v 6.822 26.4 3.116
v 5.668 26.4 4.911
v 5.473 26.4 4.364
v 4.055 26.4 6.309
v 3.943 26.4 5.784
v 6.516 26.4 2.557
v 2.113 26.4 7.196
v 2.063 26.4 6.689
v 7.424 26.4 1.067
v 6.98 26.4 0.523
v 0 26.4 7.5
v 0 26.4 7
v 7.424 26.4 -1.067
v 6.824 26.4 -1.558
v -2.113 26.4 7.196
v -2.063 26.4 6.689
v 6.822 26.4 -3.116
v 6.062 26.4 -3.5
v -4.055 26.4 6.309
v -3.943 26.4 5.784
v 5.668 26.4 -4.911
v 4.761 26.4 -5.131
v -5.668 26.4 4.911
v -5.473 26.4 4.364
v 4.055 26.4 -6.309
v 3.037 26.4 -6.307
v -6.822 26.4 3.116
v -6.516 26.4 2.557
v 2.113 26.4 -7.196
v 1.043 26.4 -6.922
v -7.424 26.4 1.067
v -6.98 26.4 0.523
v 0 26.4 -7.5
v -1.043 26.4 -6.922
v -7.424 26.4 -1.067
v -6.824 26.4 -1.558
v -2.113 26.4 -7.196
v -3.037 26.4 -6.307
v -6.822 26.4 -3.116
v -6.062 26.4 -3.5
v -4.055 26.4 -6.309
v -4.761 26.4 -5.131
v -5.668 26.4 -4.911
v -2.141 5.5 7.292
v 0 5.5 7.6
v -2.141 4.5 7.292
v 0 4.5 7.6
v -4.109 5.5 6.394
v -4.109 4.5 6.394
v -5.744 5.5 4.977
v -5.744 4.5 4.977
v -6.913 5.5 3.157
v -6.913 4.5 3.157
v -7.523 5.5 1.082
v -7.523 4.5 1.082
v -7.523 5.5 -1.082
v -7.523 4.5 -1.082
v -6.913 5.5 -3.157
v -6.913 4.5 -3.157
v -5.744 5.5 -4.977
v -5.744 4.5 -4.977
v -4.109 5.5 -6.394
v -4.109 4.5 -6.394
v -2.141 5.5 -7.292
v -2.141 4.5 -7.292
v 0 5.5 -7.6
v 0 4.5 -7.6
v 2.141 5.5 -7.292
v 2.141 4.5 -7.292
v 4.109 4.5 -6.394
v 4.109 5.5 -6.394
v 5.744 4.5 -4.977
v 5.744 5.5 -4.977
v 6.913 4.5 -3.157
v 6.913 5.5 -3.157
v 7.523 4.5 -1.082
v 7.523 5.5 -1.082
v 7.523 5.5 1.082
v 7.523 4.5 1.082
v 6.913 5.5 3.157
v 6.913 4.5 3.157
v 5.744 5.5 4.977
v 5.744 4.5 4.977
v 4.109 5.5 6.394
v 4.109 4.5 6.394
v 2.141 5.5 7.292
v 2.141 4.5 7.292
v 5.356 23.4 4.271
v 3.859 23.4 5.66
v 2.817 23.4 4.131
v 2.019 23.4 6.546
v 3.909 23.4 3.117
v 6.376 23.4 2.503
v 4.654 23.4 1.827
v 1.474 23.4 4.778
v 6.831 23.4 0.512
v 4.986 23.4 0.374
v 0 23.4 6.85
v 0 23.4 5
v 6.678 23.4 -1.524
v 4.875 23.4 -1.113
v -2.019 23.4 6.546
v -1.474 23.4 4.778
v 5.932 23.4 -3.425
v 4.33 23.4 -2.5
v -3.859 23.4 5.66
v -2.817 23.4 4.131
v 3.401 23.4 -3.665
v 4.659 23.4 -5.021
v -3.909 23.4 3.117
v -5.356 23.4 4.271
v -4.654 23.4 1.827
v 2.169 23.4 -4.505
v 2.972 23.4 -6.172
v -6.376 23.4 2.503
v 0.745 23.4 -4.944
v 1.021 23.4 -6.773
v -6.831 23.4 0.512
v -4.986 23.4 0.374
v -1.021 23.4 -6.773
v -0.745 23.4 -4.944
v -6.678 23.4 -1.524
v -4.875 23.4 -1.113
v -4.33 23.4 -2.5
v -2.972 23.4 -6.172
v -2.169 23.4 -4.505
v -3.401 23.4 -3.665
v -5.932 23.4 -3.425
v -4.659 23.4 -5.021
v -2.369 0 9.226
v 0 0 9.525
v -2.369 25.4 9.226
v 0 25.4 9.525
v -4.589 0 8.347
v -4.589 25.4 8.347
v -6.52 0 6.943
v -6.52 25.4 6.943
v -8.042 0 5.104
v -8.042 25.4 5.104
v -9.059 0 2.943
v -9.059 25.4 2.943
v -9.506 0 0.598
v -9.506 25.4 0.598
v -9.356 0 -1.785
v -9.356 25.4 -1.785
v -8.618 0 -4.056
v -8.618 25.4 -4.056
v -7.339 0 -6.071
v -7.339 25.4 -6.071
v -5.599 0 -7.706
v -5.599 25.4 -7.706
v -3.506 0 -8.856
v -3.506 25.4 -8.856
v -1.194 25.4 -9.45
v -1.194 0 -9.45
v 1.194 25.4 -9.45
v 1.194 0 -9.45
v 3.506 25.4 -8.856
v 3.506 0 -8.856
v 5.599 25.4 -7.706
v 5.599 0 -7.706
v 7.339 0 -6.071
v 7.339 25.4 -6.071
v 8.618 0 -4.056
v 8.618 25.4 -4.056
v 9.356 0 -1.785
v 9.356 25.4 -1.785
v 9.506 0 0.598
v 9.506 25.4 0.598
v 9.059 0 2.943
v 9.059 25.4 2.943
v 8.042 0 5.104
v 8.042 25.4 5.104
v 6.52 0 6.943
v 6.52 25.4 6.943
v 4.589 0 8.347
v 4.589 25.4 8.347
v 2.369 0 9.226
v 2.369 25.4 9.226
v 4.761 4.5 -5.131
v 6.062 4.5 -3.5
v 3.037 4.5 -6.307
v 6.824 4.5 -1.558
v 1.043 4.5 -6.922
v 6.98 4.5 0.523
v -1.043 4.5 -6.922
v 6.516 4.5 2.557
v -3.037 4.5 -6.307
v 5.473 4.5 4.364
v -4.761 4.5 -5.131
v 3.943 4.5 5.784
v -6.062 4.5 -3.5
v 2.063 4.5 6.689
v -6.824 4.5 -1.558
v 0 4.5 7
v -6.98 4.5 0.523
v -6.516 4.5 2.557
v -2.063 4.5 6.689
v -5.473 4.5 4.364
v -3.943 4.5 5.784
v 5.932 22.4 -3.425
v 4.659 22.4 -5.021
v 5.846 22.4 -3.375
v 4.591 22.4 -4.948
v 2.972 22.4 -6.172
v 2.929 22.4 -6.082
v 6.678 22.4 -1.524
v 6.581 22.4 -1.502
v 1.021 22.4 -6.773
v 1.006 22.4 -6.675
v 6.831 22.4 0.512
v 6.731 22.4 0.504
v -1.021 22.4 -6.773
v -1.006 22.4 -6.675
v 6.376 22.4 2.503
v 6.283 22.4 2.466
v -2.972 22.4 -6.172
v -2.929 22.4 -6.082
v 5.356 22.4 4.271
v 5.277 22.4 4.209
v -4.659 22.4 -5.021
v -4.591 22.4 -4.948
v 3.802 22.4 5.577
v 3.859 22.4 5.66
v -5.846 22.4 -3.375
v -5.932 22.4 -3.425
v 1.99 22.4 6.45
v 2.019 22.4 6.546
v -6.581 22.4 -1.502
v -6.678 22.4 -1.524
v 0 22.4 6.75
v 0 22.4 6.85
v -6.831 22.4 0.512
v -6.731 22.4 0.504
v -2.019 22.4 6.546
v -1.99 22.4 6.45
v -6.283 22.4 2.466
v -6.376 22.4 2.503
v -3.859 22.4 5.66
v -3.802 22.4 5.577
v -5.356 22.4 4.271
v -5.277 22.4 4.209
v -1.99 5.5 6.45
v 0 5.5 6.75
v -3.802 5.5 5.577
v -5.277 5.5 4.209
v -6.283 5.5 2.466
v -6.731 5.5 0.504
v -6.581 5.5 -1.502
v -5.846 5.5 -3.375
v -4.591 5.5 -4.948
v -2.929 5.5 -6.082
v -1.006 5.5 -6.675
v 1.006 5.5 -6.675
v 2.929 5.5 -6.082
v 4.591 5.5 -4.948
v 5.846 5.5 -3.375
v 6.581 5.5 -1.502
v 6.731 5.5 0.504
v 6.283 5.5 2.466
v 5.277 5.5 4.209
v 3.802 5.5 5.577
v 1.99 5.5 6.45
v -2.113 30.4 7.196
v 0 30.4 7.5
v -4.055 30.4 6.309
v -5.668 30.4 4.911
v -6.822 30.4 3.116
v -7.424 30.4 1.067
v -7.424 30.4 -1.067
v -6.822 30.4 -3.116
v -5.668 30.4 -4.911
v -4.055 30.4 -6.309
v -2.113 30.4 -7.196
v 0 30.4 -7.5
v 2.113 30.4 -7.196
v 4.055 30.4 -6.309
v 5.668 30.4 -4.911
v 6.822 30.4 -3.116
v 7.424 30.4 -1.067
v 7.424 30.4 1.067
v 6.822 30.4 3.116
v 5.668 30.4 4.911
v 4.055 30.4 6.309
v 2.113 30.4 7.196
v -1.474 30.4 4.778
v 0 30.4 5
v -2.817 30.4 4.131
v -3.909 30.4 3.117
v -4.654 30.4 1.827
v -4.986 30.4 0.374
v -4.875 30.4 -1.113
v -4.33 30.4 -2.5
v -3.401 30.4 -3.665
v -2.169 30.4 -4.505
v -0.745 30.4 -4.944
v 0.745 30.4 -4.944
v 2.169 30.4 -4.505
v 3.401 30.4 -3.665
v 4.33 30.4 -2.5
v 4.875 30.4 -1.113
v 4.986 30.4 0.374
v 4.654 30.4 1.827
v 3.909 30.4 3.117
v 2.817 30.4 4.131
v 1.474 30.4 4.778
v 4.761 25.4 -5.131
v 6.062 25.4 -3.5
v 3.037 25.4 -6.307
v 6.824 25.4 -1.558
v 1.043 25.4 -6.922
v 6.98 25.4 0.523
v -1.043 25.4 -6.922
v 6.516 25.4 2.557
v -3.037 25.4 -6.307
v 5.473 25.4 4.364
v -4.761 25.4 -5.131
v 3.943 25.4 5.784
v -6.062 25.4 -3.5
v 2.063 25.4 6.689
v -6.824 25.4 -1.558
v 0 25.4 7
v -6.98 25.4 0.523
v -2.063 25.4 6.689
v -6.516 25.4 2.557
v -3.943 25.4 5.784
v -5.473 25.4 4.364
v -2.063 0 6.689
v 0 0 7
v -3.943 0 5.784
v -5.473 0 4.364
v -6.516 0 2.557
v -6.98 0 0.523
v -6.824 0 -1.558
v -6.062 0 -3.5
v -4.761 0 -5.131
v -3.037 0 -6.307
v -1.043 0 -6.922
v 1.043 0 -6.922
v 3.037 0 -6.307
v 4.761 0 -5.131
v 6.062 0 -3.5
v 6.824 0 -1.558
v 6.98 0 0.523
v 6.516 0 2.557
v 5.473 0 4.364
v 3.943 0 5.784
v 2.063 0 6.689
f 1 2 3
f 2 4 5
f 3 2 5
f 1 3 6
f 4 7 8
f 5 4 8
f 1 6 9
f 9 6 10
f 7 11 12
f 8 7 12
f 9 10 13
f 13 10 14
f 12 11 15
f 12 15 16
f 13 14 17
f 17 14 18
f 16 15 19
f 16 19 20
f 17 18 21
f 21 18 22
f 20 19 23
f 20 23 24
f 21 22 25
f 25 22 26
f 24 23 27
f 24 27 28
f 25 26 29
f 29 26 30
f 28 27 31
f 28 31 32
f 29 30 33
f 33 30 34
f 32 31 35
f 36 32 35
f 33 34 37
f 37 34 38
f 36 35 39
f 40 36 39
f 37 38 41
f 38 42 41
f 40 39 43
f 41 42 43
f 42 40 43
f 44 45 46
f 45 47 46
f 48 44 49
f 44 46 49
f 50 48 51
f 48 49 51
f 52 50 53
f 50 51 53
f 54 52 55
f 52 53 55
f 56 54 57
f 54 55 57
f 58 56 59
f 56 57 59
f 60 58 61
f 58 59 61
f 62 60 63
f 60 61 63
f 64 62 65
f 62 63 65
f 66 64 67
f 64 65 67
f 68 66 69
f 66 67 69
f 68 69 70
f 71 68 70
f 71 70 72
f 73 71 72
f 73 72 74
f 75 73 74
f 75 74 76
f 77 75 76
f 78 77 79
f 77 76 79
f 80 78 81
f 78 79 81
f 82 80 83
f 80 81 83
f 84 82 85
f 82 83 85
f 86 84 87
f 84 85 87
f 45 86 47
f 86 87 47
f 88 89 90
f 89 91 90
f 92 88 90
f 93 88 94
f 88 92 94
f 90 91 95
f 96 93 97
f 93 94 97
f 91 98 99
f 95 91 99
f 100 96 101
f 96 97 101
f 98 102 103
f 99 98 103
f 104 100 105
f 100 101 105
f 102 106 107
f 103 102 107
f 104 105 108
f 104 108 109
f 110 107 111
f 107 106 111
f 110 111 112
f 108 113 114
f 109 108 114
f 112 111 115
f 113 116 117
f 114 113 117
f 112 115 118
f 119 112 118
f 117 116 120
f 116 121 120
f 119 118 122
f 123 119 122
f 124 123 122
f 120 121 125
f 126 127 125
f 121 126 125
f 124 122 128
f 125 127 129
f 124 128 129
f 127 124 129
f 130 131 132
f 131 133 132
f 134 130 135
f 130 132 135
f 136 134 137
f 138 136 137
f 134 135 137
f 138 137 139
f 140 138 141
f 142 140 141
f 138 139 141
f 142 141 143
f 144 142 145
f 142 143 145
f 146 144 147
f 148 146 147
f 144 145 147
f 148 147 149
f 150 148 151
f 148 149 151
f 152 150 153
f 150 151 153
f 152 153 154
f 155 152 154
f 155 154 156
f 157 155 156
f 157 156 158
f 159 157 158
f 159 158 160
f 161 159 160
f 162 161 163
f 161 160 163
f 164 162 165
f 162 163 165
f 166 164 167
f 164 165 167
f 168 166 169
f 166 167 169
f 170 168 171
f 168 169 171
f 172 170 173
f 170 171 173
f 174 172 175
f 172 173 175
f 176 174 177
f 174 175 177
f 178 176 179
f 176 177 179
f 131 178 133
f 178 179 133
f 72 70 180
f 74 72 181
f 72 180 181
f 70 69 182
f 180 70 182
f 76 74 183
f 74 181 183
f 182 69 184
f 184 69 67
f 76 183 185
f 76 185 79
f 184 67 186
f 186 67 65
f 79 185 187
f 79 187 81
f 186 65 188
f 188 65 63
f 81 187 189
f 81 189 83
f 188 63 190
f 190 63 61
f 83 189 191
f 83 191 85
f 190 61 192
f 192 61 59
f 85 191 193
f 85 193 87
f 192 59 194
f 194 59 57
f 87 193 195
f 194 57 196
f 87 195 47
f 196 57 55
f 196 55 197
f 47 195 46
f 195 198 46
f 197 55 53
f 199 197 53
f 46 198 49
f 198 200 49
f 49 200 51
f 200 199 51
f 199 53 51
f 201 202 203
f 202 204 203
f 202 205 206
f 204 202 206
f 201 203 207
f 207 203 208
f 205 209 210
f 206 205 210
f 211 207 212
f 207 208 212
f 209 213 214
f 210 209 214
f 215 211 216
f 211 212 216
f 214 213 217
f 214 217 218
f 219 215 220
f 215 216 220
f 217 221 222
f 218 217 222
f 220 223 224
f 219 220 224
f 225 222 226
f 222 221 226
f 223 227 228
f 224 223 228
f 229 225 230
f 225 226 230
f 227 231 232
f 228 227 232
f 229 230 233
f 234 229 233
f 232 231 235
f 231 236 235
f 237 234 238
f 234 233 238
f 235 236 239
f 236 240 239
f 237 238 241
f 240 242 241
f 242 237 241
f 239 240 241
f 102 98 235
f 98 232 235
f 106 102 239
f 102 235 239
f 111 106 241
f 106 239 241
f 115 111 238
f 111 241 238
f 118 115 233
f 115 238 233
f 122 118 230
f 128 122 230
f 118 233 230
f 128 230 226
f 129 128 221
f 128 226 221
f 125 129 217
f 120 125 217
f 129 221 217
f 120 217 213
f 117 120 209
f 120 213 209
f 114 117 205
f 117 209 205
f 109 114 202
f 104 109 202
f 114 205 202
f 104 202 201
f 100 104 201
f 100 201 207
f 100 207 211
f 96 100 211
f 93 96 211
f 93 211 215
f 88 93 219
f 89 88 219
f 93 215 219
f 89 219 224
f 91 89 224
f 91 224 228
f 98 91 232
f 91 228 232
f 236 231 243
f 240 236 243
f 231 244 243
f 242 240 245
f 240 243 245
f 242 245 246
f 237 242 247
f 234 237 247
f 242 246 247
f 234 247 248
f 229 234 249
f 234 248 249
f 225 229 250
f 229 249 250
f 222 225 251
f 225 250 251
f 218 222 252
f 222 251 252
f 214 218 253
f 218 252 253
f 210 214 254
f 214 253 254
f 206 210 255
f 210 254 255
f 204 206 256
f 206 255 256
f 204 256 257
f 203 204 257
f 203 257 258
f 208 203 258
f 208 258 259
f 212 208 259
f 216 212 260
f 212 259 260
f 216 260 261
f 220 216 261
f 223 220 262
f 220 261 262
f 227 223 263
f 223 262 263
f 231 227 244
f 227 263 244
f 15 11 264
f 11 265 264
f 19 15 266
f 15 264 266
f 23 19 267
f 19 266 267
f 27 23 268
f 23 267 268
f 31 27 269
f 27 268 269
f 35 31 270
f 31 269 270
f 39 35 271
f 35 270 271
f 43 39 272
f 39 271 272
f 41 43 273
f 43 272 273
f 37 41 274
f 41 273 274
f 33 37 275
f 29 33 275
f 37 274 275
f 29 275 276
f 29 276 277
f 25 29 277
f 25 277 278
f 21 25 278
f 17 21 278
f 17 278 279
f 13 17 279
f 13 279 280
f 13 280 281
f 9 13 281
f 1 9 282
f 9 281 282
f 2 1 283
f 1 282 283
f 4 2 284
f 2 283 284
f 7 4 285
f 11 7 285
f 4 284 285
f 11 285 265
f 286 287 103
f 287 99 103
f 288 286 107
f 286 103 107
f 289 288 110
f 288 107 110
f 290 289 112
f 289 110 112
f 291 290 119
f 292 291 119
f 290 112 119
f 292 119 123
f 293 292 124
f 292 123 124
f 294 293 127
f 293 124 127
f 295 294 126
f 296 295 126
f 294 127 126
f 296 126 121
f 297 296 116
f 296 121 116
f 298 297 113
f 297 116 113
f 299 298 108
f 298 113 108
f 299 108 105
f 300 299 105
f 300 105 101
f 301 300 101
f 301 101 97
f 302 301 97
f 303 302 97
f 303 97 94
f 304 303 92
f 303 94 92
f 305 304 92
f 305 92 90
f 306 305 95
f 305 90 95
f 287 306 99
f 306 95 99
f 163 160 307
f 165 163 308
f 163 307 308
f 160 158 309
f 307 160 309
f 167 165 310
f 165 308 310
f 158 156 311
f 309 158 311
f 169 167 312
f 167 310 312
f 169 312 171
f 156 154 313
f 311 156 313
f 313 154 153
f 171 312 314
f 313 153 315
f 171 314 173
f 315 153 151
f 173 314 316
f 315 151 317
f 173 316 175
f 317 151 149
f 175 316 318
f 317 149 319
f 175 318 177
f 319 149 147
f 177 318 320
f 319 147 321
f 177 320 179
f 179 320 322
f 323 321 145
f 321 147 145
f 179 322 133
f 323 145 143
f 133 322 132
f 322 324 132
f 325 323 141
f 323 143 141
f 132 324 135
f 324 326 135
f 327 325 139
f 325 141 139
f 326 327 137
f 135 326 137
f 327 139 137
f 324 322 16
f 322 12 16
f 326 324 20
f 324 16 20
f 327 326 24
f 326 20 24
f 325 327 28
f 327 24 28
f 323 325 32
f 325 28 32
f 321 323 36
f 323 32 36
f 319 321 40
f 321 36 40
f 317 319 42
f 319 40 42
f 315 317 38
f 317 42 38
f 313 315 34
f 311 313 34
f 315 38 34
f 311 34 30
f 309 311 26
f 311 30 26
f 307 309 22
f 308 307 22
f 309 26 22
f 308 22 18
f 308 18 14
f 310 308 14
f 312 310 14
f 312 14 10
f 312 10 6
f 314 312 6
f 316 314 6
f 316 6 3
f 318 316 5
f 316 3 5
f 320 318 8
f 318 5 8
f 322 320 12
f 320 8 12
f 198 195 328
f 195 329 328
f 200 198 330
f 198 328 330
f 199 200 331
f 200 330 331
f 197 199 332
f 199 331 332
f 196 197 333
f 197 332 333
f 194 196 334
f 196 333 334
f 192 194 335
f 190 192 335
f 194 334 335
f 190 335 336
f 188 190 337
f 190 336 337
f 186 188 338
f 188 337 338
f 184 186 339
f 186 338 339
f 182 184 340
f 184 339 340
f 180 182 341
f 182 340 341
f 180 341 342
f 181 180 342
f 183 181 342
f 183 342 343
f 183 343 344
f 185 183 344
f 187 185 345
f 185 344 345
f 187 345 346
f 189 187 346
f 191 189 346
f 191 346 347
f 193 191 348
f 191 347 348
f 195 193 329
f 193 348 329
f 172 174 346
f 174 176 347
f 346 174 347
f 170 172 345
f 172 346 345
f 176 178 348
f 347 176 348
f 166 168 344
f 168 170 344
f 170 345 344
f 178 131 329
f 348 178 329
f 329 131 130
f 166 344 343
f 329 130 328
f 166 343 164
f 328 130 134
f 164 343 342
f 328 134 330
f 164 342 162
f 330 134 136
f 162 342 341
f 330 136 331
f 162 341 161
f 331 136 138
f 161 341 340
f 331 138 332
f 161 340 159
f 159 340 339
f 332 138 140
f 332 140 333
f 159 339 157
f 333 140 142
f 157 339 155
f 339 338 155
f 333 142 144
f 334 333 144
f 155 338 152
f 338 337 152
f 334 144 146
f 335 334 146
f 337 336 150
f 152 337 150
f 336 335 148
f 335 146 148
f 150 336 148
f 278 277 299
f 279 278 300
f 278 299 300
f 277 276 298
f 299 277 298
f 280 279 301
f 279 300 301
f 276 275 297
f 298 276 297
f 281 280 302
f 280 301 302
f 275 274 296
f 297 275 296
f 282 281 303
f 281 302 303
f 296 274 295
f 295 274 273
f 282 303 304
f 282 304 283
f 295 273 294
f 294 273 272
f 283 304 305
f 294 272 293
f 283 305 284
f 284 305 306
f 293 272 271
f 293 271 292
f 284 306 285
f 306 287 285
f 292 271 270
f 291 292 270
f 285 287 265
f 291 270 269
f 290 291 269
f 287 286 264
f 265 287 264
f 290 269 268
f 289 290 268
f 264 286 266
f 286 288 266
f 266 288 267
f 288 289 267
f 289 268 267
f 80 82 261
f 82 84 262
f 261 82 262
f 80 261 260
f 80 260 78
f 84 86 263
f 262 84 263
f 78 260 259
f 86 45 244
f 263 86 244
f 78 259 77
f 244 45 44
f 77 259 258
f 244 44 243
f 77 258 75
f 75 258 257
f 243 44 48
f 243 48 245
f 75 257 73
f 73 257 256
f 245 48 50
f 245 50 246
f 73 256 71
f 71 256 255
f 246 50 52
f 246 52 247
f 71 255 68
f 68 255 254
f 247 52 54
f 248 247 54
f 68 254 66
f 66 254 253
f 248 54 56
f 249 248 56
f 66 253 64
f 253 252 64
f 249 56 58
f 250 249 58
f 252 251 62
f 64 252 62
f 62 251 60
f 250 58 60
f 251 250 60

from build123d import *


with BuildPart() as part:
    # 草图1 → 旋转1 (revolve)
    with BuildSketch(Plane.XY, mode=Mode.PRIVATE) as revolve_1_sk:
        Polygon((7, 26.4), (7.5, 26.4), (7.5, 30.4), (5, 30.4), (5, 23.4), (6.85, 23.4), (6.85, 22.4), (6.75, 22.4), (6.75, 5.5), (7.6, 5.5), (7.6, 4.5), (7, 4.5), (7, 0), (9.525, 0), (9.525, 25.4), (7, 25.4), align=None)
    revolve(revolve_1_sk.sketch.rotate(Axis((0, 161.376166943, 0), (0, -1, 0)), 90), axis=Axis((0, 161.376166943, 0), (0, -1, 0)))  # turned: the seam where the file's is


solid = part.part
